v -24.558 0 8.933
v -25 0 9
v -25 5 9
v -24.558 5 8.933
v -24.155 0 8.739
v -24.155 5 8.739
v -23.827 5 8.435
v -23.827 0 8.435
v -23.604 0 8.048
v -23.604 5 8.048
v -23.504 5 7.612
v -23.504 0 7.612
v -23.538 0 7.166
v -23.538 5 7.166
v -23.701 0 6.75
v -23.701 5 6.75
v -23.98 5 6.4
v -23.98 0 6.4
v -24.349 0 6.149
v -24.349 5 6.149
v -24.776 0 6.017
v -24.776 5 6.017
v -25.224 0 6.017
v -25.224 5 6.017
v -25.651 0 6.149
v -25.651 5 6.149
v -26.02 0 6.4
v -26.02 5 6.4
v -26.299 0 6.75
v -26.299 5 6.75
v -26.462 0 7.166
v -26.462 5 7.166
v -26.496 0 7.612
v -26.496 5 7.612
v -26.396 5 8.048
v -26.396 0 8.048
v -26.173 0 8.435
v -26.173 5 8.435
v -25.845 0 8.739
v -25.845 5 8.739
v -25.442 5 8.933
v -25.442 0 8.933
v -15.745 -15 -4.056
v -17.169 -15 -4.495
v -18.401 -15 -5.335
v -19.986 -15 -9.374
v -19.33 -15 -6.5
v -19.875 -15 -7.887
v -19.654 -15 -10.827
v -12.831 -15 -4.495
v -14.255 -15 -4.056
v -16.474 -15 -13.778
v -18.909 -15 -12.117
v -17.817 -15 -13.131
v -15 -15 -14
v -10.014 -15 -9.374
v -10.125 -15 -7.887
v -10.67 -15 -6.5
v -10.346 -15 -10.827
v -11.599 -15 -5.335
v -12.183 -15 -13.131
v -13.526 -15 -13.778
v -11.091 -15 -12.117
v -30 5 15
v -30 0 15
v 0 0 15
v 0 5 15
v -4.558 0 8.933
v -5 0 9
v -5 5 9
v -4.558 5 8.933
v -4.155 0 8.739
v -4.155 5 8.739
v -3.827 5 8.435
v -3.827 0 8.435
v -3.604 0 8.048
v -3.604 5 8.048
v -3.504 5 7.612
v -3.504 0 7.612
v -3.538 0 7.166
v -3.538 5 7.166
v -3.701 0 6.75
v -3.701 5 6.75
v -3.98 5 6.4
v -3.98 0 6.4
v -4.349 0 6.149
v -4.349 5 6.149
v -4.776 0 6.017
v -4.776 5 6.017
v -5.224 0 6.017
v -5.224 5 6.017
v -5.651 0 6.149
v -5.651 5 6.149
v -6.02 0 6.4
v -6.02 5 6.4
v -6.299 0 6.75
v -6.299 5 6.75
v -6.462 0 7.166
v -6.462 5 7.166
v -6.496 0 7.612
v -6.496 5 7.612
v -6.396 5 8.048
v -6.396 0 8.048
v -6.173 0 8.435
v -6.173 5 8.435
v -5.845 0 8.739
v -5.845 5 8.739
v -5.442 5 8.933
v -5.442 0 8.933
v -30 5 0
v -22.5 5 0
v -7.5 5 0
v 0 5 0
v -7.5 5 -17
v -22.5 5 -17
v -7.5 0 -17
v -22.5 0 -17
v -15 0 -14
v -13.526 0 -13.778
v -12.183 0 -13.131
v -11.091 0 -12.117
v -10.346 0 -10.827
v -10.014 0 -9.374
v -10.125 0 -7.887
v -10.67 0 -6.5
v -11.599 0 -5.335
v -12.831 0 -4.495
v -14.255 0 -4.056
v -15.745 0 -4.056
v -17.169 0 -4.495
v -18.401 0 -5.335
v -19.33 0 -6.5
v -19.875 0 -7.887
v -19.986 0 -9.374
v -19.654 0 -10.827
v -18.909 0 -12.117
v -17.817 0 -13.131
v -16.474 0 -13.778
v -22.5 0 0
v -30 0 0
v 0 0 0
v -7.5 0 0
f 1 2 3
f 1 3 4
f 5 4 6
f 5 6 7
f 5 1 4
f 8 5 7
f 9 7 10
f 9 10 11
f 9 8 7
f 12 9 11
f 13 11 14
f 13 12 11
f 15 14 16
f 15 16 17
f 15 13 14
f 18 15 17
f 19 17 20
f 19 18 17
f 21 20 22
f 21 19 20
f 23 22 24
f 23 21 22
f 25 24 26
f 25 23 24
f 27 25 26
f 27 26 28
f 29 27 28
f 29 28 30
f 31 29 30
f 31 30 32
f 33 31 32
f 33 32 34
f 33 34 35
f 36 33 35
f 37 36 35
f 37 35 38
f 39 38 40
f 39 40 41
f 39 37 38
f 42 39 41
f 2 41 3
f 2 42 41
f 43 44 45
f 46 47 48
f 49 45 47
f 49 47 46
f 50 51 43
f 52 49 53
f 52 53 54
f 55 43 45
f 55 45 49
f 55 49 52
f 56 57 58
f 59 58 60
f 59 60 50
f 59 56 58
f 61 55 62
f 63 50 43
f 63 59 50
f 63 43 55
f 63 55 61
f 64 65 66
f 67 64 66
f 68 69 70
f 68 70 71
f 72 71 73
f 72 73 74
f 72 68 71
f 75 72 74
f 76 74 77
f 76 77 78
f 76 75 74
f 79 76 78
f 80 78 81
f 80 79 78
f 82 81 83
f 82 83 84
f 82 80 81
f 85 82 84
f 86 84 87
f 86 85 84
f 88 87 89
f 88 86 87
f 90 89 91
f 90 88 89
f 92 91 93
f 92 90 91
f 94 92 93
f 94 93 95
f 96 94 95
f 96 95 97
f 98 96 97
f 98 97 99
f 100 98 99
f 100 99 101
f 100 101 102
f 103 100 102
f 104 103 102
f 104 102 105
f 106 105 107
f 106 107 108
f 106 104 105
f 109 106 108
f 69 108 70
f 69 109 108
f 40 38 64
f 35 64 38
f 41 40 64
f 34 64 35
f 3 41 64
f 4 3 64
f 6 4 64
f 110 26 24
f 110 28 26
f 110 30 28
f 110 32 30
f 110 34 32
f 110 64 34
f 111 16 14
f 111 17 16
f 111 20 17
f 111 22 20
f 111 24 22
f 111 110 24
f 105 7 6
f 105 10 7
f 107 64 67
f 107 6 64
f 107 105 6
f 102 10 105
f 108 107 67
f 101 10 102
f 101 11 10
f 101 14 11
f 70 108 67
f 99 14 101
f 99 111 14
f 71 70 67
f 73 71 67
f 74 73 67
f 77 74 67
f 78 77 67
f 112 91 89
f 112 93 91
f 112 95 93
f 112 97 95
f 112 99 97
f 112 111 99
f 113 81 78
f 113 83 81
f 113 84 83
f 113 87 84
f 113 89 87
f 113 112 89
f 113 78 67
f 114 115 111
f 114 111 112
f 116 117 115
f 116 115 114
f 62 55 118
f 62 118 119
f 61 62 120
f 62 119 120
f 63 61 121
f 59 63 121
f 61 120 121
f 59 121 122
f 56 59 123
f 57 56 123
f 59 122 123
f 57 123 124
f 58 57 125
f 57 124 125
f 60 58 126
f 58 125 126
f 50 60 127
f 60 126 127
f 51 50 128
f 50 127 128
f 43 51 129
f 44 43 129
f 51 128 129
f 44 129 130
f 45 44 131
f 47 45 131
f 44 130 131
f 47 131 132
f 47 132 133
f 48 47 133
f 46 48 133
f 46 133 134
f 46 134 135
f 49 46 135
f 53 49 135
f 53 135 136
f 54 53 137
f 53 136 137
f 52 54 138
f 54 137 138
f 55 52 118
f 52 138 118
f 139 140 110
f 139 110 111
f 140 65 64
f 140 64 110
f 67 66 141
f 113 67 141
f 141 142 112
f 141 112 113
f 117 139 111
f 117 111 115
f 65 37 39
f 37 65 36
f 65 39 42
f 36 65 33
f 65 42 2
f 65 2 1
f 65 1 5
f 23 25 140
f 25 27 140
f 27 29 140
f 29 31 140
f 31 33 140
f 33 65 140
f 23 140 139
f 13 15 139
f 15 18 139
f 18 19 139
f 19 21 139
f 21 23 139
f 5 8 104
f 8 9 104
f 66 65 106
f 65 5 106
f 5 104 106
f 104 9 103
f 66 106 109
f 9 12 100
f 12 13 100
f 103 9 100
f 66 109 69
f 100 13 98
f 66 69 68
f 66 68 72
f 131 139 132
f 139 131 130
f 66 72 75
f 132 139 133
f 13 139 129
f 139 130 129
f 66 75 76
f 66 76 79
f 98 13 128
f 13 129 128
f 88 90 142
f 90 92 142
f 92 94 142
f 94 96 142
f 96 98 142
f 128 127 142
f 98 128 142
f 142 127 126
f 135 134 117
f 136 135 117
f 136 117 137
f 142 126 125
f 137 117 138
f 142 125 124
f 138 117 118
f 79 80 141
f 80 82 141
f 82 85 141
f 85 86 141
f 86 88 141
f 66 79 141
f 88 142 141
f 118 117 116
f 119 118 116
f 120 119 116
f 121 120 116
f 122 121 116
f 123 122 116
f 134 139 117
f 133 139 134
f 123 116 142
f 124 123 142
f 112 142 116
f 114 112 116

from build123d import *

# Parameters (mm, degrees)
SKETCH1_W           = 30
SKETCH1_H           = 15
SKETCH1_R           = 1.5
SKETCH1_W_2         = 15
SKETCH1_H_2         = 17
SKETCH1_R_2         = 5
BOSS_EXTRUDE1_DEPTH = 5
SKETCH3_R           = 5
BOSS_EXTRUDE2_DEPTH = 15


with BuildPart() as part:
    # Sketch1 → Boss-Extrude1 (new body)
    # profile 1 of 3: a face of its own
    with BuildSketch(Plane(origin=(0, 0, 0), x_dir=(1, 0, 0), z_dir=(0, 1, 0))):
        with Locations((-15, -7.5)):
            Rectangle(SKETCH1_W, SKETCH1_H)
        with Locations(Location((-5, -7.5, 0), (0, 0, 270))):
            Circle(SKETCH1_R, mode=Mode.SUBTRACT)
        with Locations(Location((-25, -7.5, 0), (0, 0, 270))):
            Circle(SKETCH1_R, mode=Mode.SUBTRACT)
    # profile 2 of 3: a face of its own
    with BuildSketch(Plane(origin=(0, 0, 0), x_dir=(1, 0, 0), z_dir=(0, 1, 0))):
        with Locations((-15, 8.5)):
            Rectangle(SKETCH1_W_2, SKETCH1_H_2)
        with Locations((-15, 9)):
            Circle(SKETCH1_R_2, mode=Mode.SUBTRACT)
    # profile 3 of 3: a face of its own
    with BuildSketch(Plane(origin=(0, 0, 0), x_dir=(1, 0, 0), z_dir=(0, 1, 0))):
        with Locations((-15, 9)):
            Circle(SKETCH1_R_2)
    extrude(amount=BOSS_EXTRUDE1_DEPTH)

    # Sketch3 → Boss-Extrude2 (add)
    with BuildSketch(Plane.XZ):
        with Locations(Location((-15, -9, 0), (0, 0, 270))):
            Circle(SKETCH3_R)
    extrude(amount=BOSS_EXTRUDE2_DEPTH)


solid = part.part
